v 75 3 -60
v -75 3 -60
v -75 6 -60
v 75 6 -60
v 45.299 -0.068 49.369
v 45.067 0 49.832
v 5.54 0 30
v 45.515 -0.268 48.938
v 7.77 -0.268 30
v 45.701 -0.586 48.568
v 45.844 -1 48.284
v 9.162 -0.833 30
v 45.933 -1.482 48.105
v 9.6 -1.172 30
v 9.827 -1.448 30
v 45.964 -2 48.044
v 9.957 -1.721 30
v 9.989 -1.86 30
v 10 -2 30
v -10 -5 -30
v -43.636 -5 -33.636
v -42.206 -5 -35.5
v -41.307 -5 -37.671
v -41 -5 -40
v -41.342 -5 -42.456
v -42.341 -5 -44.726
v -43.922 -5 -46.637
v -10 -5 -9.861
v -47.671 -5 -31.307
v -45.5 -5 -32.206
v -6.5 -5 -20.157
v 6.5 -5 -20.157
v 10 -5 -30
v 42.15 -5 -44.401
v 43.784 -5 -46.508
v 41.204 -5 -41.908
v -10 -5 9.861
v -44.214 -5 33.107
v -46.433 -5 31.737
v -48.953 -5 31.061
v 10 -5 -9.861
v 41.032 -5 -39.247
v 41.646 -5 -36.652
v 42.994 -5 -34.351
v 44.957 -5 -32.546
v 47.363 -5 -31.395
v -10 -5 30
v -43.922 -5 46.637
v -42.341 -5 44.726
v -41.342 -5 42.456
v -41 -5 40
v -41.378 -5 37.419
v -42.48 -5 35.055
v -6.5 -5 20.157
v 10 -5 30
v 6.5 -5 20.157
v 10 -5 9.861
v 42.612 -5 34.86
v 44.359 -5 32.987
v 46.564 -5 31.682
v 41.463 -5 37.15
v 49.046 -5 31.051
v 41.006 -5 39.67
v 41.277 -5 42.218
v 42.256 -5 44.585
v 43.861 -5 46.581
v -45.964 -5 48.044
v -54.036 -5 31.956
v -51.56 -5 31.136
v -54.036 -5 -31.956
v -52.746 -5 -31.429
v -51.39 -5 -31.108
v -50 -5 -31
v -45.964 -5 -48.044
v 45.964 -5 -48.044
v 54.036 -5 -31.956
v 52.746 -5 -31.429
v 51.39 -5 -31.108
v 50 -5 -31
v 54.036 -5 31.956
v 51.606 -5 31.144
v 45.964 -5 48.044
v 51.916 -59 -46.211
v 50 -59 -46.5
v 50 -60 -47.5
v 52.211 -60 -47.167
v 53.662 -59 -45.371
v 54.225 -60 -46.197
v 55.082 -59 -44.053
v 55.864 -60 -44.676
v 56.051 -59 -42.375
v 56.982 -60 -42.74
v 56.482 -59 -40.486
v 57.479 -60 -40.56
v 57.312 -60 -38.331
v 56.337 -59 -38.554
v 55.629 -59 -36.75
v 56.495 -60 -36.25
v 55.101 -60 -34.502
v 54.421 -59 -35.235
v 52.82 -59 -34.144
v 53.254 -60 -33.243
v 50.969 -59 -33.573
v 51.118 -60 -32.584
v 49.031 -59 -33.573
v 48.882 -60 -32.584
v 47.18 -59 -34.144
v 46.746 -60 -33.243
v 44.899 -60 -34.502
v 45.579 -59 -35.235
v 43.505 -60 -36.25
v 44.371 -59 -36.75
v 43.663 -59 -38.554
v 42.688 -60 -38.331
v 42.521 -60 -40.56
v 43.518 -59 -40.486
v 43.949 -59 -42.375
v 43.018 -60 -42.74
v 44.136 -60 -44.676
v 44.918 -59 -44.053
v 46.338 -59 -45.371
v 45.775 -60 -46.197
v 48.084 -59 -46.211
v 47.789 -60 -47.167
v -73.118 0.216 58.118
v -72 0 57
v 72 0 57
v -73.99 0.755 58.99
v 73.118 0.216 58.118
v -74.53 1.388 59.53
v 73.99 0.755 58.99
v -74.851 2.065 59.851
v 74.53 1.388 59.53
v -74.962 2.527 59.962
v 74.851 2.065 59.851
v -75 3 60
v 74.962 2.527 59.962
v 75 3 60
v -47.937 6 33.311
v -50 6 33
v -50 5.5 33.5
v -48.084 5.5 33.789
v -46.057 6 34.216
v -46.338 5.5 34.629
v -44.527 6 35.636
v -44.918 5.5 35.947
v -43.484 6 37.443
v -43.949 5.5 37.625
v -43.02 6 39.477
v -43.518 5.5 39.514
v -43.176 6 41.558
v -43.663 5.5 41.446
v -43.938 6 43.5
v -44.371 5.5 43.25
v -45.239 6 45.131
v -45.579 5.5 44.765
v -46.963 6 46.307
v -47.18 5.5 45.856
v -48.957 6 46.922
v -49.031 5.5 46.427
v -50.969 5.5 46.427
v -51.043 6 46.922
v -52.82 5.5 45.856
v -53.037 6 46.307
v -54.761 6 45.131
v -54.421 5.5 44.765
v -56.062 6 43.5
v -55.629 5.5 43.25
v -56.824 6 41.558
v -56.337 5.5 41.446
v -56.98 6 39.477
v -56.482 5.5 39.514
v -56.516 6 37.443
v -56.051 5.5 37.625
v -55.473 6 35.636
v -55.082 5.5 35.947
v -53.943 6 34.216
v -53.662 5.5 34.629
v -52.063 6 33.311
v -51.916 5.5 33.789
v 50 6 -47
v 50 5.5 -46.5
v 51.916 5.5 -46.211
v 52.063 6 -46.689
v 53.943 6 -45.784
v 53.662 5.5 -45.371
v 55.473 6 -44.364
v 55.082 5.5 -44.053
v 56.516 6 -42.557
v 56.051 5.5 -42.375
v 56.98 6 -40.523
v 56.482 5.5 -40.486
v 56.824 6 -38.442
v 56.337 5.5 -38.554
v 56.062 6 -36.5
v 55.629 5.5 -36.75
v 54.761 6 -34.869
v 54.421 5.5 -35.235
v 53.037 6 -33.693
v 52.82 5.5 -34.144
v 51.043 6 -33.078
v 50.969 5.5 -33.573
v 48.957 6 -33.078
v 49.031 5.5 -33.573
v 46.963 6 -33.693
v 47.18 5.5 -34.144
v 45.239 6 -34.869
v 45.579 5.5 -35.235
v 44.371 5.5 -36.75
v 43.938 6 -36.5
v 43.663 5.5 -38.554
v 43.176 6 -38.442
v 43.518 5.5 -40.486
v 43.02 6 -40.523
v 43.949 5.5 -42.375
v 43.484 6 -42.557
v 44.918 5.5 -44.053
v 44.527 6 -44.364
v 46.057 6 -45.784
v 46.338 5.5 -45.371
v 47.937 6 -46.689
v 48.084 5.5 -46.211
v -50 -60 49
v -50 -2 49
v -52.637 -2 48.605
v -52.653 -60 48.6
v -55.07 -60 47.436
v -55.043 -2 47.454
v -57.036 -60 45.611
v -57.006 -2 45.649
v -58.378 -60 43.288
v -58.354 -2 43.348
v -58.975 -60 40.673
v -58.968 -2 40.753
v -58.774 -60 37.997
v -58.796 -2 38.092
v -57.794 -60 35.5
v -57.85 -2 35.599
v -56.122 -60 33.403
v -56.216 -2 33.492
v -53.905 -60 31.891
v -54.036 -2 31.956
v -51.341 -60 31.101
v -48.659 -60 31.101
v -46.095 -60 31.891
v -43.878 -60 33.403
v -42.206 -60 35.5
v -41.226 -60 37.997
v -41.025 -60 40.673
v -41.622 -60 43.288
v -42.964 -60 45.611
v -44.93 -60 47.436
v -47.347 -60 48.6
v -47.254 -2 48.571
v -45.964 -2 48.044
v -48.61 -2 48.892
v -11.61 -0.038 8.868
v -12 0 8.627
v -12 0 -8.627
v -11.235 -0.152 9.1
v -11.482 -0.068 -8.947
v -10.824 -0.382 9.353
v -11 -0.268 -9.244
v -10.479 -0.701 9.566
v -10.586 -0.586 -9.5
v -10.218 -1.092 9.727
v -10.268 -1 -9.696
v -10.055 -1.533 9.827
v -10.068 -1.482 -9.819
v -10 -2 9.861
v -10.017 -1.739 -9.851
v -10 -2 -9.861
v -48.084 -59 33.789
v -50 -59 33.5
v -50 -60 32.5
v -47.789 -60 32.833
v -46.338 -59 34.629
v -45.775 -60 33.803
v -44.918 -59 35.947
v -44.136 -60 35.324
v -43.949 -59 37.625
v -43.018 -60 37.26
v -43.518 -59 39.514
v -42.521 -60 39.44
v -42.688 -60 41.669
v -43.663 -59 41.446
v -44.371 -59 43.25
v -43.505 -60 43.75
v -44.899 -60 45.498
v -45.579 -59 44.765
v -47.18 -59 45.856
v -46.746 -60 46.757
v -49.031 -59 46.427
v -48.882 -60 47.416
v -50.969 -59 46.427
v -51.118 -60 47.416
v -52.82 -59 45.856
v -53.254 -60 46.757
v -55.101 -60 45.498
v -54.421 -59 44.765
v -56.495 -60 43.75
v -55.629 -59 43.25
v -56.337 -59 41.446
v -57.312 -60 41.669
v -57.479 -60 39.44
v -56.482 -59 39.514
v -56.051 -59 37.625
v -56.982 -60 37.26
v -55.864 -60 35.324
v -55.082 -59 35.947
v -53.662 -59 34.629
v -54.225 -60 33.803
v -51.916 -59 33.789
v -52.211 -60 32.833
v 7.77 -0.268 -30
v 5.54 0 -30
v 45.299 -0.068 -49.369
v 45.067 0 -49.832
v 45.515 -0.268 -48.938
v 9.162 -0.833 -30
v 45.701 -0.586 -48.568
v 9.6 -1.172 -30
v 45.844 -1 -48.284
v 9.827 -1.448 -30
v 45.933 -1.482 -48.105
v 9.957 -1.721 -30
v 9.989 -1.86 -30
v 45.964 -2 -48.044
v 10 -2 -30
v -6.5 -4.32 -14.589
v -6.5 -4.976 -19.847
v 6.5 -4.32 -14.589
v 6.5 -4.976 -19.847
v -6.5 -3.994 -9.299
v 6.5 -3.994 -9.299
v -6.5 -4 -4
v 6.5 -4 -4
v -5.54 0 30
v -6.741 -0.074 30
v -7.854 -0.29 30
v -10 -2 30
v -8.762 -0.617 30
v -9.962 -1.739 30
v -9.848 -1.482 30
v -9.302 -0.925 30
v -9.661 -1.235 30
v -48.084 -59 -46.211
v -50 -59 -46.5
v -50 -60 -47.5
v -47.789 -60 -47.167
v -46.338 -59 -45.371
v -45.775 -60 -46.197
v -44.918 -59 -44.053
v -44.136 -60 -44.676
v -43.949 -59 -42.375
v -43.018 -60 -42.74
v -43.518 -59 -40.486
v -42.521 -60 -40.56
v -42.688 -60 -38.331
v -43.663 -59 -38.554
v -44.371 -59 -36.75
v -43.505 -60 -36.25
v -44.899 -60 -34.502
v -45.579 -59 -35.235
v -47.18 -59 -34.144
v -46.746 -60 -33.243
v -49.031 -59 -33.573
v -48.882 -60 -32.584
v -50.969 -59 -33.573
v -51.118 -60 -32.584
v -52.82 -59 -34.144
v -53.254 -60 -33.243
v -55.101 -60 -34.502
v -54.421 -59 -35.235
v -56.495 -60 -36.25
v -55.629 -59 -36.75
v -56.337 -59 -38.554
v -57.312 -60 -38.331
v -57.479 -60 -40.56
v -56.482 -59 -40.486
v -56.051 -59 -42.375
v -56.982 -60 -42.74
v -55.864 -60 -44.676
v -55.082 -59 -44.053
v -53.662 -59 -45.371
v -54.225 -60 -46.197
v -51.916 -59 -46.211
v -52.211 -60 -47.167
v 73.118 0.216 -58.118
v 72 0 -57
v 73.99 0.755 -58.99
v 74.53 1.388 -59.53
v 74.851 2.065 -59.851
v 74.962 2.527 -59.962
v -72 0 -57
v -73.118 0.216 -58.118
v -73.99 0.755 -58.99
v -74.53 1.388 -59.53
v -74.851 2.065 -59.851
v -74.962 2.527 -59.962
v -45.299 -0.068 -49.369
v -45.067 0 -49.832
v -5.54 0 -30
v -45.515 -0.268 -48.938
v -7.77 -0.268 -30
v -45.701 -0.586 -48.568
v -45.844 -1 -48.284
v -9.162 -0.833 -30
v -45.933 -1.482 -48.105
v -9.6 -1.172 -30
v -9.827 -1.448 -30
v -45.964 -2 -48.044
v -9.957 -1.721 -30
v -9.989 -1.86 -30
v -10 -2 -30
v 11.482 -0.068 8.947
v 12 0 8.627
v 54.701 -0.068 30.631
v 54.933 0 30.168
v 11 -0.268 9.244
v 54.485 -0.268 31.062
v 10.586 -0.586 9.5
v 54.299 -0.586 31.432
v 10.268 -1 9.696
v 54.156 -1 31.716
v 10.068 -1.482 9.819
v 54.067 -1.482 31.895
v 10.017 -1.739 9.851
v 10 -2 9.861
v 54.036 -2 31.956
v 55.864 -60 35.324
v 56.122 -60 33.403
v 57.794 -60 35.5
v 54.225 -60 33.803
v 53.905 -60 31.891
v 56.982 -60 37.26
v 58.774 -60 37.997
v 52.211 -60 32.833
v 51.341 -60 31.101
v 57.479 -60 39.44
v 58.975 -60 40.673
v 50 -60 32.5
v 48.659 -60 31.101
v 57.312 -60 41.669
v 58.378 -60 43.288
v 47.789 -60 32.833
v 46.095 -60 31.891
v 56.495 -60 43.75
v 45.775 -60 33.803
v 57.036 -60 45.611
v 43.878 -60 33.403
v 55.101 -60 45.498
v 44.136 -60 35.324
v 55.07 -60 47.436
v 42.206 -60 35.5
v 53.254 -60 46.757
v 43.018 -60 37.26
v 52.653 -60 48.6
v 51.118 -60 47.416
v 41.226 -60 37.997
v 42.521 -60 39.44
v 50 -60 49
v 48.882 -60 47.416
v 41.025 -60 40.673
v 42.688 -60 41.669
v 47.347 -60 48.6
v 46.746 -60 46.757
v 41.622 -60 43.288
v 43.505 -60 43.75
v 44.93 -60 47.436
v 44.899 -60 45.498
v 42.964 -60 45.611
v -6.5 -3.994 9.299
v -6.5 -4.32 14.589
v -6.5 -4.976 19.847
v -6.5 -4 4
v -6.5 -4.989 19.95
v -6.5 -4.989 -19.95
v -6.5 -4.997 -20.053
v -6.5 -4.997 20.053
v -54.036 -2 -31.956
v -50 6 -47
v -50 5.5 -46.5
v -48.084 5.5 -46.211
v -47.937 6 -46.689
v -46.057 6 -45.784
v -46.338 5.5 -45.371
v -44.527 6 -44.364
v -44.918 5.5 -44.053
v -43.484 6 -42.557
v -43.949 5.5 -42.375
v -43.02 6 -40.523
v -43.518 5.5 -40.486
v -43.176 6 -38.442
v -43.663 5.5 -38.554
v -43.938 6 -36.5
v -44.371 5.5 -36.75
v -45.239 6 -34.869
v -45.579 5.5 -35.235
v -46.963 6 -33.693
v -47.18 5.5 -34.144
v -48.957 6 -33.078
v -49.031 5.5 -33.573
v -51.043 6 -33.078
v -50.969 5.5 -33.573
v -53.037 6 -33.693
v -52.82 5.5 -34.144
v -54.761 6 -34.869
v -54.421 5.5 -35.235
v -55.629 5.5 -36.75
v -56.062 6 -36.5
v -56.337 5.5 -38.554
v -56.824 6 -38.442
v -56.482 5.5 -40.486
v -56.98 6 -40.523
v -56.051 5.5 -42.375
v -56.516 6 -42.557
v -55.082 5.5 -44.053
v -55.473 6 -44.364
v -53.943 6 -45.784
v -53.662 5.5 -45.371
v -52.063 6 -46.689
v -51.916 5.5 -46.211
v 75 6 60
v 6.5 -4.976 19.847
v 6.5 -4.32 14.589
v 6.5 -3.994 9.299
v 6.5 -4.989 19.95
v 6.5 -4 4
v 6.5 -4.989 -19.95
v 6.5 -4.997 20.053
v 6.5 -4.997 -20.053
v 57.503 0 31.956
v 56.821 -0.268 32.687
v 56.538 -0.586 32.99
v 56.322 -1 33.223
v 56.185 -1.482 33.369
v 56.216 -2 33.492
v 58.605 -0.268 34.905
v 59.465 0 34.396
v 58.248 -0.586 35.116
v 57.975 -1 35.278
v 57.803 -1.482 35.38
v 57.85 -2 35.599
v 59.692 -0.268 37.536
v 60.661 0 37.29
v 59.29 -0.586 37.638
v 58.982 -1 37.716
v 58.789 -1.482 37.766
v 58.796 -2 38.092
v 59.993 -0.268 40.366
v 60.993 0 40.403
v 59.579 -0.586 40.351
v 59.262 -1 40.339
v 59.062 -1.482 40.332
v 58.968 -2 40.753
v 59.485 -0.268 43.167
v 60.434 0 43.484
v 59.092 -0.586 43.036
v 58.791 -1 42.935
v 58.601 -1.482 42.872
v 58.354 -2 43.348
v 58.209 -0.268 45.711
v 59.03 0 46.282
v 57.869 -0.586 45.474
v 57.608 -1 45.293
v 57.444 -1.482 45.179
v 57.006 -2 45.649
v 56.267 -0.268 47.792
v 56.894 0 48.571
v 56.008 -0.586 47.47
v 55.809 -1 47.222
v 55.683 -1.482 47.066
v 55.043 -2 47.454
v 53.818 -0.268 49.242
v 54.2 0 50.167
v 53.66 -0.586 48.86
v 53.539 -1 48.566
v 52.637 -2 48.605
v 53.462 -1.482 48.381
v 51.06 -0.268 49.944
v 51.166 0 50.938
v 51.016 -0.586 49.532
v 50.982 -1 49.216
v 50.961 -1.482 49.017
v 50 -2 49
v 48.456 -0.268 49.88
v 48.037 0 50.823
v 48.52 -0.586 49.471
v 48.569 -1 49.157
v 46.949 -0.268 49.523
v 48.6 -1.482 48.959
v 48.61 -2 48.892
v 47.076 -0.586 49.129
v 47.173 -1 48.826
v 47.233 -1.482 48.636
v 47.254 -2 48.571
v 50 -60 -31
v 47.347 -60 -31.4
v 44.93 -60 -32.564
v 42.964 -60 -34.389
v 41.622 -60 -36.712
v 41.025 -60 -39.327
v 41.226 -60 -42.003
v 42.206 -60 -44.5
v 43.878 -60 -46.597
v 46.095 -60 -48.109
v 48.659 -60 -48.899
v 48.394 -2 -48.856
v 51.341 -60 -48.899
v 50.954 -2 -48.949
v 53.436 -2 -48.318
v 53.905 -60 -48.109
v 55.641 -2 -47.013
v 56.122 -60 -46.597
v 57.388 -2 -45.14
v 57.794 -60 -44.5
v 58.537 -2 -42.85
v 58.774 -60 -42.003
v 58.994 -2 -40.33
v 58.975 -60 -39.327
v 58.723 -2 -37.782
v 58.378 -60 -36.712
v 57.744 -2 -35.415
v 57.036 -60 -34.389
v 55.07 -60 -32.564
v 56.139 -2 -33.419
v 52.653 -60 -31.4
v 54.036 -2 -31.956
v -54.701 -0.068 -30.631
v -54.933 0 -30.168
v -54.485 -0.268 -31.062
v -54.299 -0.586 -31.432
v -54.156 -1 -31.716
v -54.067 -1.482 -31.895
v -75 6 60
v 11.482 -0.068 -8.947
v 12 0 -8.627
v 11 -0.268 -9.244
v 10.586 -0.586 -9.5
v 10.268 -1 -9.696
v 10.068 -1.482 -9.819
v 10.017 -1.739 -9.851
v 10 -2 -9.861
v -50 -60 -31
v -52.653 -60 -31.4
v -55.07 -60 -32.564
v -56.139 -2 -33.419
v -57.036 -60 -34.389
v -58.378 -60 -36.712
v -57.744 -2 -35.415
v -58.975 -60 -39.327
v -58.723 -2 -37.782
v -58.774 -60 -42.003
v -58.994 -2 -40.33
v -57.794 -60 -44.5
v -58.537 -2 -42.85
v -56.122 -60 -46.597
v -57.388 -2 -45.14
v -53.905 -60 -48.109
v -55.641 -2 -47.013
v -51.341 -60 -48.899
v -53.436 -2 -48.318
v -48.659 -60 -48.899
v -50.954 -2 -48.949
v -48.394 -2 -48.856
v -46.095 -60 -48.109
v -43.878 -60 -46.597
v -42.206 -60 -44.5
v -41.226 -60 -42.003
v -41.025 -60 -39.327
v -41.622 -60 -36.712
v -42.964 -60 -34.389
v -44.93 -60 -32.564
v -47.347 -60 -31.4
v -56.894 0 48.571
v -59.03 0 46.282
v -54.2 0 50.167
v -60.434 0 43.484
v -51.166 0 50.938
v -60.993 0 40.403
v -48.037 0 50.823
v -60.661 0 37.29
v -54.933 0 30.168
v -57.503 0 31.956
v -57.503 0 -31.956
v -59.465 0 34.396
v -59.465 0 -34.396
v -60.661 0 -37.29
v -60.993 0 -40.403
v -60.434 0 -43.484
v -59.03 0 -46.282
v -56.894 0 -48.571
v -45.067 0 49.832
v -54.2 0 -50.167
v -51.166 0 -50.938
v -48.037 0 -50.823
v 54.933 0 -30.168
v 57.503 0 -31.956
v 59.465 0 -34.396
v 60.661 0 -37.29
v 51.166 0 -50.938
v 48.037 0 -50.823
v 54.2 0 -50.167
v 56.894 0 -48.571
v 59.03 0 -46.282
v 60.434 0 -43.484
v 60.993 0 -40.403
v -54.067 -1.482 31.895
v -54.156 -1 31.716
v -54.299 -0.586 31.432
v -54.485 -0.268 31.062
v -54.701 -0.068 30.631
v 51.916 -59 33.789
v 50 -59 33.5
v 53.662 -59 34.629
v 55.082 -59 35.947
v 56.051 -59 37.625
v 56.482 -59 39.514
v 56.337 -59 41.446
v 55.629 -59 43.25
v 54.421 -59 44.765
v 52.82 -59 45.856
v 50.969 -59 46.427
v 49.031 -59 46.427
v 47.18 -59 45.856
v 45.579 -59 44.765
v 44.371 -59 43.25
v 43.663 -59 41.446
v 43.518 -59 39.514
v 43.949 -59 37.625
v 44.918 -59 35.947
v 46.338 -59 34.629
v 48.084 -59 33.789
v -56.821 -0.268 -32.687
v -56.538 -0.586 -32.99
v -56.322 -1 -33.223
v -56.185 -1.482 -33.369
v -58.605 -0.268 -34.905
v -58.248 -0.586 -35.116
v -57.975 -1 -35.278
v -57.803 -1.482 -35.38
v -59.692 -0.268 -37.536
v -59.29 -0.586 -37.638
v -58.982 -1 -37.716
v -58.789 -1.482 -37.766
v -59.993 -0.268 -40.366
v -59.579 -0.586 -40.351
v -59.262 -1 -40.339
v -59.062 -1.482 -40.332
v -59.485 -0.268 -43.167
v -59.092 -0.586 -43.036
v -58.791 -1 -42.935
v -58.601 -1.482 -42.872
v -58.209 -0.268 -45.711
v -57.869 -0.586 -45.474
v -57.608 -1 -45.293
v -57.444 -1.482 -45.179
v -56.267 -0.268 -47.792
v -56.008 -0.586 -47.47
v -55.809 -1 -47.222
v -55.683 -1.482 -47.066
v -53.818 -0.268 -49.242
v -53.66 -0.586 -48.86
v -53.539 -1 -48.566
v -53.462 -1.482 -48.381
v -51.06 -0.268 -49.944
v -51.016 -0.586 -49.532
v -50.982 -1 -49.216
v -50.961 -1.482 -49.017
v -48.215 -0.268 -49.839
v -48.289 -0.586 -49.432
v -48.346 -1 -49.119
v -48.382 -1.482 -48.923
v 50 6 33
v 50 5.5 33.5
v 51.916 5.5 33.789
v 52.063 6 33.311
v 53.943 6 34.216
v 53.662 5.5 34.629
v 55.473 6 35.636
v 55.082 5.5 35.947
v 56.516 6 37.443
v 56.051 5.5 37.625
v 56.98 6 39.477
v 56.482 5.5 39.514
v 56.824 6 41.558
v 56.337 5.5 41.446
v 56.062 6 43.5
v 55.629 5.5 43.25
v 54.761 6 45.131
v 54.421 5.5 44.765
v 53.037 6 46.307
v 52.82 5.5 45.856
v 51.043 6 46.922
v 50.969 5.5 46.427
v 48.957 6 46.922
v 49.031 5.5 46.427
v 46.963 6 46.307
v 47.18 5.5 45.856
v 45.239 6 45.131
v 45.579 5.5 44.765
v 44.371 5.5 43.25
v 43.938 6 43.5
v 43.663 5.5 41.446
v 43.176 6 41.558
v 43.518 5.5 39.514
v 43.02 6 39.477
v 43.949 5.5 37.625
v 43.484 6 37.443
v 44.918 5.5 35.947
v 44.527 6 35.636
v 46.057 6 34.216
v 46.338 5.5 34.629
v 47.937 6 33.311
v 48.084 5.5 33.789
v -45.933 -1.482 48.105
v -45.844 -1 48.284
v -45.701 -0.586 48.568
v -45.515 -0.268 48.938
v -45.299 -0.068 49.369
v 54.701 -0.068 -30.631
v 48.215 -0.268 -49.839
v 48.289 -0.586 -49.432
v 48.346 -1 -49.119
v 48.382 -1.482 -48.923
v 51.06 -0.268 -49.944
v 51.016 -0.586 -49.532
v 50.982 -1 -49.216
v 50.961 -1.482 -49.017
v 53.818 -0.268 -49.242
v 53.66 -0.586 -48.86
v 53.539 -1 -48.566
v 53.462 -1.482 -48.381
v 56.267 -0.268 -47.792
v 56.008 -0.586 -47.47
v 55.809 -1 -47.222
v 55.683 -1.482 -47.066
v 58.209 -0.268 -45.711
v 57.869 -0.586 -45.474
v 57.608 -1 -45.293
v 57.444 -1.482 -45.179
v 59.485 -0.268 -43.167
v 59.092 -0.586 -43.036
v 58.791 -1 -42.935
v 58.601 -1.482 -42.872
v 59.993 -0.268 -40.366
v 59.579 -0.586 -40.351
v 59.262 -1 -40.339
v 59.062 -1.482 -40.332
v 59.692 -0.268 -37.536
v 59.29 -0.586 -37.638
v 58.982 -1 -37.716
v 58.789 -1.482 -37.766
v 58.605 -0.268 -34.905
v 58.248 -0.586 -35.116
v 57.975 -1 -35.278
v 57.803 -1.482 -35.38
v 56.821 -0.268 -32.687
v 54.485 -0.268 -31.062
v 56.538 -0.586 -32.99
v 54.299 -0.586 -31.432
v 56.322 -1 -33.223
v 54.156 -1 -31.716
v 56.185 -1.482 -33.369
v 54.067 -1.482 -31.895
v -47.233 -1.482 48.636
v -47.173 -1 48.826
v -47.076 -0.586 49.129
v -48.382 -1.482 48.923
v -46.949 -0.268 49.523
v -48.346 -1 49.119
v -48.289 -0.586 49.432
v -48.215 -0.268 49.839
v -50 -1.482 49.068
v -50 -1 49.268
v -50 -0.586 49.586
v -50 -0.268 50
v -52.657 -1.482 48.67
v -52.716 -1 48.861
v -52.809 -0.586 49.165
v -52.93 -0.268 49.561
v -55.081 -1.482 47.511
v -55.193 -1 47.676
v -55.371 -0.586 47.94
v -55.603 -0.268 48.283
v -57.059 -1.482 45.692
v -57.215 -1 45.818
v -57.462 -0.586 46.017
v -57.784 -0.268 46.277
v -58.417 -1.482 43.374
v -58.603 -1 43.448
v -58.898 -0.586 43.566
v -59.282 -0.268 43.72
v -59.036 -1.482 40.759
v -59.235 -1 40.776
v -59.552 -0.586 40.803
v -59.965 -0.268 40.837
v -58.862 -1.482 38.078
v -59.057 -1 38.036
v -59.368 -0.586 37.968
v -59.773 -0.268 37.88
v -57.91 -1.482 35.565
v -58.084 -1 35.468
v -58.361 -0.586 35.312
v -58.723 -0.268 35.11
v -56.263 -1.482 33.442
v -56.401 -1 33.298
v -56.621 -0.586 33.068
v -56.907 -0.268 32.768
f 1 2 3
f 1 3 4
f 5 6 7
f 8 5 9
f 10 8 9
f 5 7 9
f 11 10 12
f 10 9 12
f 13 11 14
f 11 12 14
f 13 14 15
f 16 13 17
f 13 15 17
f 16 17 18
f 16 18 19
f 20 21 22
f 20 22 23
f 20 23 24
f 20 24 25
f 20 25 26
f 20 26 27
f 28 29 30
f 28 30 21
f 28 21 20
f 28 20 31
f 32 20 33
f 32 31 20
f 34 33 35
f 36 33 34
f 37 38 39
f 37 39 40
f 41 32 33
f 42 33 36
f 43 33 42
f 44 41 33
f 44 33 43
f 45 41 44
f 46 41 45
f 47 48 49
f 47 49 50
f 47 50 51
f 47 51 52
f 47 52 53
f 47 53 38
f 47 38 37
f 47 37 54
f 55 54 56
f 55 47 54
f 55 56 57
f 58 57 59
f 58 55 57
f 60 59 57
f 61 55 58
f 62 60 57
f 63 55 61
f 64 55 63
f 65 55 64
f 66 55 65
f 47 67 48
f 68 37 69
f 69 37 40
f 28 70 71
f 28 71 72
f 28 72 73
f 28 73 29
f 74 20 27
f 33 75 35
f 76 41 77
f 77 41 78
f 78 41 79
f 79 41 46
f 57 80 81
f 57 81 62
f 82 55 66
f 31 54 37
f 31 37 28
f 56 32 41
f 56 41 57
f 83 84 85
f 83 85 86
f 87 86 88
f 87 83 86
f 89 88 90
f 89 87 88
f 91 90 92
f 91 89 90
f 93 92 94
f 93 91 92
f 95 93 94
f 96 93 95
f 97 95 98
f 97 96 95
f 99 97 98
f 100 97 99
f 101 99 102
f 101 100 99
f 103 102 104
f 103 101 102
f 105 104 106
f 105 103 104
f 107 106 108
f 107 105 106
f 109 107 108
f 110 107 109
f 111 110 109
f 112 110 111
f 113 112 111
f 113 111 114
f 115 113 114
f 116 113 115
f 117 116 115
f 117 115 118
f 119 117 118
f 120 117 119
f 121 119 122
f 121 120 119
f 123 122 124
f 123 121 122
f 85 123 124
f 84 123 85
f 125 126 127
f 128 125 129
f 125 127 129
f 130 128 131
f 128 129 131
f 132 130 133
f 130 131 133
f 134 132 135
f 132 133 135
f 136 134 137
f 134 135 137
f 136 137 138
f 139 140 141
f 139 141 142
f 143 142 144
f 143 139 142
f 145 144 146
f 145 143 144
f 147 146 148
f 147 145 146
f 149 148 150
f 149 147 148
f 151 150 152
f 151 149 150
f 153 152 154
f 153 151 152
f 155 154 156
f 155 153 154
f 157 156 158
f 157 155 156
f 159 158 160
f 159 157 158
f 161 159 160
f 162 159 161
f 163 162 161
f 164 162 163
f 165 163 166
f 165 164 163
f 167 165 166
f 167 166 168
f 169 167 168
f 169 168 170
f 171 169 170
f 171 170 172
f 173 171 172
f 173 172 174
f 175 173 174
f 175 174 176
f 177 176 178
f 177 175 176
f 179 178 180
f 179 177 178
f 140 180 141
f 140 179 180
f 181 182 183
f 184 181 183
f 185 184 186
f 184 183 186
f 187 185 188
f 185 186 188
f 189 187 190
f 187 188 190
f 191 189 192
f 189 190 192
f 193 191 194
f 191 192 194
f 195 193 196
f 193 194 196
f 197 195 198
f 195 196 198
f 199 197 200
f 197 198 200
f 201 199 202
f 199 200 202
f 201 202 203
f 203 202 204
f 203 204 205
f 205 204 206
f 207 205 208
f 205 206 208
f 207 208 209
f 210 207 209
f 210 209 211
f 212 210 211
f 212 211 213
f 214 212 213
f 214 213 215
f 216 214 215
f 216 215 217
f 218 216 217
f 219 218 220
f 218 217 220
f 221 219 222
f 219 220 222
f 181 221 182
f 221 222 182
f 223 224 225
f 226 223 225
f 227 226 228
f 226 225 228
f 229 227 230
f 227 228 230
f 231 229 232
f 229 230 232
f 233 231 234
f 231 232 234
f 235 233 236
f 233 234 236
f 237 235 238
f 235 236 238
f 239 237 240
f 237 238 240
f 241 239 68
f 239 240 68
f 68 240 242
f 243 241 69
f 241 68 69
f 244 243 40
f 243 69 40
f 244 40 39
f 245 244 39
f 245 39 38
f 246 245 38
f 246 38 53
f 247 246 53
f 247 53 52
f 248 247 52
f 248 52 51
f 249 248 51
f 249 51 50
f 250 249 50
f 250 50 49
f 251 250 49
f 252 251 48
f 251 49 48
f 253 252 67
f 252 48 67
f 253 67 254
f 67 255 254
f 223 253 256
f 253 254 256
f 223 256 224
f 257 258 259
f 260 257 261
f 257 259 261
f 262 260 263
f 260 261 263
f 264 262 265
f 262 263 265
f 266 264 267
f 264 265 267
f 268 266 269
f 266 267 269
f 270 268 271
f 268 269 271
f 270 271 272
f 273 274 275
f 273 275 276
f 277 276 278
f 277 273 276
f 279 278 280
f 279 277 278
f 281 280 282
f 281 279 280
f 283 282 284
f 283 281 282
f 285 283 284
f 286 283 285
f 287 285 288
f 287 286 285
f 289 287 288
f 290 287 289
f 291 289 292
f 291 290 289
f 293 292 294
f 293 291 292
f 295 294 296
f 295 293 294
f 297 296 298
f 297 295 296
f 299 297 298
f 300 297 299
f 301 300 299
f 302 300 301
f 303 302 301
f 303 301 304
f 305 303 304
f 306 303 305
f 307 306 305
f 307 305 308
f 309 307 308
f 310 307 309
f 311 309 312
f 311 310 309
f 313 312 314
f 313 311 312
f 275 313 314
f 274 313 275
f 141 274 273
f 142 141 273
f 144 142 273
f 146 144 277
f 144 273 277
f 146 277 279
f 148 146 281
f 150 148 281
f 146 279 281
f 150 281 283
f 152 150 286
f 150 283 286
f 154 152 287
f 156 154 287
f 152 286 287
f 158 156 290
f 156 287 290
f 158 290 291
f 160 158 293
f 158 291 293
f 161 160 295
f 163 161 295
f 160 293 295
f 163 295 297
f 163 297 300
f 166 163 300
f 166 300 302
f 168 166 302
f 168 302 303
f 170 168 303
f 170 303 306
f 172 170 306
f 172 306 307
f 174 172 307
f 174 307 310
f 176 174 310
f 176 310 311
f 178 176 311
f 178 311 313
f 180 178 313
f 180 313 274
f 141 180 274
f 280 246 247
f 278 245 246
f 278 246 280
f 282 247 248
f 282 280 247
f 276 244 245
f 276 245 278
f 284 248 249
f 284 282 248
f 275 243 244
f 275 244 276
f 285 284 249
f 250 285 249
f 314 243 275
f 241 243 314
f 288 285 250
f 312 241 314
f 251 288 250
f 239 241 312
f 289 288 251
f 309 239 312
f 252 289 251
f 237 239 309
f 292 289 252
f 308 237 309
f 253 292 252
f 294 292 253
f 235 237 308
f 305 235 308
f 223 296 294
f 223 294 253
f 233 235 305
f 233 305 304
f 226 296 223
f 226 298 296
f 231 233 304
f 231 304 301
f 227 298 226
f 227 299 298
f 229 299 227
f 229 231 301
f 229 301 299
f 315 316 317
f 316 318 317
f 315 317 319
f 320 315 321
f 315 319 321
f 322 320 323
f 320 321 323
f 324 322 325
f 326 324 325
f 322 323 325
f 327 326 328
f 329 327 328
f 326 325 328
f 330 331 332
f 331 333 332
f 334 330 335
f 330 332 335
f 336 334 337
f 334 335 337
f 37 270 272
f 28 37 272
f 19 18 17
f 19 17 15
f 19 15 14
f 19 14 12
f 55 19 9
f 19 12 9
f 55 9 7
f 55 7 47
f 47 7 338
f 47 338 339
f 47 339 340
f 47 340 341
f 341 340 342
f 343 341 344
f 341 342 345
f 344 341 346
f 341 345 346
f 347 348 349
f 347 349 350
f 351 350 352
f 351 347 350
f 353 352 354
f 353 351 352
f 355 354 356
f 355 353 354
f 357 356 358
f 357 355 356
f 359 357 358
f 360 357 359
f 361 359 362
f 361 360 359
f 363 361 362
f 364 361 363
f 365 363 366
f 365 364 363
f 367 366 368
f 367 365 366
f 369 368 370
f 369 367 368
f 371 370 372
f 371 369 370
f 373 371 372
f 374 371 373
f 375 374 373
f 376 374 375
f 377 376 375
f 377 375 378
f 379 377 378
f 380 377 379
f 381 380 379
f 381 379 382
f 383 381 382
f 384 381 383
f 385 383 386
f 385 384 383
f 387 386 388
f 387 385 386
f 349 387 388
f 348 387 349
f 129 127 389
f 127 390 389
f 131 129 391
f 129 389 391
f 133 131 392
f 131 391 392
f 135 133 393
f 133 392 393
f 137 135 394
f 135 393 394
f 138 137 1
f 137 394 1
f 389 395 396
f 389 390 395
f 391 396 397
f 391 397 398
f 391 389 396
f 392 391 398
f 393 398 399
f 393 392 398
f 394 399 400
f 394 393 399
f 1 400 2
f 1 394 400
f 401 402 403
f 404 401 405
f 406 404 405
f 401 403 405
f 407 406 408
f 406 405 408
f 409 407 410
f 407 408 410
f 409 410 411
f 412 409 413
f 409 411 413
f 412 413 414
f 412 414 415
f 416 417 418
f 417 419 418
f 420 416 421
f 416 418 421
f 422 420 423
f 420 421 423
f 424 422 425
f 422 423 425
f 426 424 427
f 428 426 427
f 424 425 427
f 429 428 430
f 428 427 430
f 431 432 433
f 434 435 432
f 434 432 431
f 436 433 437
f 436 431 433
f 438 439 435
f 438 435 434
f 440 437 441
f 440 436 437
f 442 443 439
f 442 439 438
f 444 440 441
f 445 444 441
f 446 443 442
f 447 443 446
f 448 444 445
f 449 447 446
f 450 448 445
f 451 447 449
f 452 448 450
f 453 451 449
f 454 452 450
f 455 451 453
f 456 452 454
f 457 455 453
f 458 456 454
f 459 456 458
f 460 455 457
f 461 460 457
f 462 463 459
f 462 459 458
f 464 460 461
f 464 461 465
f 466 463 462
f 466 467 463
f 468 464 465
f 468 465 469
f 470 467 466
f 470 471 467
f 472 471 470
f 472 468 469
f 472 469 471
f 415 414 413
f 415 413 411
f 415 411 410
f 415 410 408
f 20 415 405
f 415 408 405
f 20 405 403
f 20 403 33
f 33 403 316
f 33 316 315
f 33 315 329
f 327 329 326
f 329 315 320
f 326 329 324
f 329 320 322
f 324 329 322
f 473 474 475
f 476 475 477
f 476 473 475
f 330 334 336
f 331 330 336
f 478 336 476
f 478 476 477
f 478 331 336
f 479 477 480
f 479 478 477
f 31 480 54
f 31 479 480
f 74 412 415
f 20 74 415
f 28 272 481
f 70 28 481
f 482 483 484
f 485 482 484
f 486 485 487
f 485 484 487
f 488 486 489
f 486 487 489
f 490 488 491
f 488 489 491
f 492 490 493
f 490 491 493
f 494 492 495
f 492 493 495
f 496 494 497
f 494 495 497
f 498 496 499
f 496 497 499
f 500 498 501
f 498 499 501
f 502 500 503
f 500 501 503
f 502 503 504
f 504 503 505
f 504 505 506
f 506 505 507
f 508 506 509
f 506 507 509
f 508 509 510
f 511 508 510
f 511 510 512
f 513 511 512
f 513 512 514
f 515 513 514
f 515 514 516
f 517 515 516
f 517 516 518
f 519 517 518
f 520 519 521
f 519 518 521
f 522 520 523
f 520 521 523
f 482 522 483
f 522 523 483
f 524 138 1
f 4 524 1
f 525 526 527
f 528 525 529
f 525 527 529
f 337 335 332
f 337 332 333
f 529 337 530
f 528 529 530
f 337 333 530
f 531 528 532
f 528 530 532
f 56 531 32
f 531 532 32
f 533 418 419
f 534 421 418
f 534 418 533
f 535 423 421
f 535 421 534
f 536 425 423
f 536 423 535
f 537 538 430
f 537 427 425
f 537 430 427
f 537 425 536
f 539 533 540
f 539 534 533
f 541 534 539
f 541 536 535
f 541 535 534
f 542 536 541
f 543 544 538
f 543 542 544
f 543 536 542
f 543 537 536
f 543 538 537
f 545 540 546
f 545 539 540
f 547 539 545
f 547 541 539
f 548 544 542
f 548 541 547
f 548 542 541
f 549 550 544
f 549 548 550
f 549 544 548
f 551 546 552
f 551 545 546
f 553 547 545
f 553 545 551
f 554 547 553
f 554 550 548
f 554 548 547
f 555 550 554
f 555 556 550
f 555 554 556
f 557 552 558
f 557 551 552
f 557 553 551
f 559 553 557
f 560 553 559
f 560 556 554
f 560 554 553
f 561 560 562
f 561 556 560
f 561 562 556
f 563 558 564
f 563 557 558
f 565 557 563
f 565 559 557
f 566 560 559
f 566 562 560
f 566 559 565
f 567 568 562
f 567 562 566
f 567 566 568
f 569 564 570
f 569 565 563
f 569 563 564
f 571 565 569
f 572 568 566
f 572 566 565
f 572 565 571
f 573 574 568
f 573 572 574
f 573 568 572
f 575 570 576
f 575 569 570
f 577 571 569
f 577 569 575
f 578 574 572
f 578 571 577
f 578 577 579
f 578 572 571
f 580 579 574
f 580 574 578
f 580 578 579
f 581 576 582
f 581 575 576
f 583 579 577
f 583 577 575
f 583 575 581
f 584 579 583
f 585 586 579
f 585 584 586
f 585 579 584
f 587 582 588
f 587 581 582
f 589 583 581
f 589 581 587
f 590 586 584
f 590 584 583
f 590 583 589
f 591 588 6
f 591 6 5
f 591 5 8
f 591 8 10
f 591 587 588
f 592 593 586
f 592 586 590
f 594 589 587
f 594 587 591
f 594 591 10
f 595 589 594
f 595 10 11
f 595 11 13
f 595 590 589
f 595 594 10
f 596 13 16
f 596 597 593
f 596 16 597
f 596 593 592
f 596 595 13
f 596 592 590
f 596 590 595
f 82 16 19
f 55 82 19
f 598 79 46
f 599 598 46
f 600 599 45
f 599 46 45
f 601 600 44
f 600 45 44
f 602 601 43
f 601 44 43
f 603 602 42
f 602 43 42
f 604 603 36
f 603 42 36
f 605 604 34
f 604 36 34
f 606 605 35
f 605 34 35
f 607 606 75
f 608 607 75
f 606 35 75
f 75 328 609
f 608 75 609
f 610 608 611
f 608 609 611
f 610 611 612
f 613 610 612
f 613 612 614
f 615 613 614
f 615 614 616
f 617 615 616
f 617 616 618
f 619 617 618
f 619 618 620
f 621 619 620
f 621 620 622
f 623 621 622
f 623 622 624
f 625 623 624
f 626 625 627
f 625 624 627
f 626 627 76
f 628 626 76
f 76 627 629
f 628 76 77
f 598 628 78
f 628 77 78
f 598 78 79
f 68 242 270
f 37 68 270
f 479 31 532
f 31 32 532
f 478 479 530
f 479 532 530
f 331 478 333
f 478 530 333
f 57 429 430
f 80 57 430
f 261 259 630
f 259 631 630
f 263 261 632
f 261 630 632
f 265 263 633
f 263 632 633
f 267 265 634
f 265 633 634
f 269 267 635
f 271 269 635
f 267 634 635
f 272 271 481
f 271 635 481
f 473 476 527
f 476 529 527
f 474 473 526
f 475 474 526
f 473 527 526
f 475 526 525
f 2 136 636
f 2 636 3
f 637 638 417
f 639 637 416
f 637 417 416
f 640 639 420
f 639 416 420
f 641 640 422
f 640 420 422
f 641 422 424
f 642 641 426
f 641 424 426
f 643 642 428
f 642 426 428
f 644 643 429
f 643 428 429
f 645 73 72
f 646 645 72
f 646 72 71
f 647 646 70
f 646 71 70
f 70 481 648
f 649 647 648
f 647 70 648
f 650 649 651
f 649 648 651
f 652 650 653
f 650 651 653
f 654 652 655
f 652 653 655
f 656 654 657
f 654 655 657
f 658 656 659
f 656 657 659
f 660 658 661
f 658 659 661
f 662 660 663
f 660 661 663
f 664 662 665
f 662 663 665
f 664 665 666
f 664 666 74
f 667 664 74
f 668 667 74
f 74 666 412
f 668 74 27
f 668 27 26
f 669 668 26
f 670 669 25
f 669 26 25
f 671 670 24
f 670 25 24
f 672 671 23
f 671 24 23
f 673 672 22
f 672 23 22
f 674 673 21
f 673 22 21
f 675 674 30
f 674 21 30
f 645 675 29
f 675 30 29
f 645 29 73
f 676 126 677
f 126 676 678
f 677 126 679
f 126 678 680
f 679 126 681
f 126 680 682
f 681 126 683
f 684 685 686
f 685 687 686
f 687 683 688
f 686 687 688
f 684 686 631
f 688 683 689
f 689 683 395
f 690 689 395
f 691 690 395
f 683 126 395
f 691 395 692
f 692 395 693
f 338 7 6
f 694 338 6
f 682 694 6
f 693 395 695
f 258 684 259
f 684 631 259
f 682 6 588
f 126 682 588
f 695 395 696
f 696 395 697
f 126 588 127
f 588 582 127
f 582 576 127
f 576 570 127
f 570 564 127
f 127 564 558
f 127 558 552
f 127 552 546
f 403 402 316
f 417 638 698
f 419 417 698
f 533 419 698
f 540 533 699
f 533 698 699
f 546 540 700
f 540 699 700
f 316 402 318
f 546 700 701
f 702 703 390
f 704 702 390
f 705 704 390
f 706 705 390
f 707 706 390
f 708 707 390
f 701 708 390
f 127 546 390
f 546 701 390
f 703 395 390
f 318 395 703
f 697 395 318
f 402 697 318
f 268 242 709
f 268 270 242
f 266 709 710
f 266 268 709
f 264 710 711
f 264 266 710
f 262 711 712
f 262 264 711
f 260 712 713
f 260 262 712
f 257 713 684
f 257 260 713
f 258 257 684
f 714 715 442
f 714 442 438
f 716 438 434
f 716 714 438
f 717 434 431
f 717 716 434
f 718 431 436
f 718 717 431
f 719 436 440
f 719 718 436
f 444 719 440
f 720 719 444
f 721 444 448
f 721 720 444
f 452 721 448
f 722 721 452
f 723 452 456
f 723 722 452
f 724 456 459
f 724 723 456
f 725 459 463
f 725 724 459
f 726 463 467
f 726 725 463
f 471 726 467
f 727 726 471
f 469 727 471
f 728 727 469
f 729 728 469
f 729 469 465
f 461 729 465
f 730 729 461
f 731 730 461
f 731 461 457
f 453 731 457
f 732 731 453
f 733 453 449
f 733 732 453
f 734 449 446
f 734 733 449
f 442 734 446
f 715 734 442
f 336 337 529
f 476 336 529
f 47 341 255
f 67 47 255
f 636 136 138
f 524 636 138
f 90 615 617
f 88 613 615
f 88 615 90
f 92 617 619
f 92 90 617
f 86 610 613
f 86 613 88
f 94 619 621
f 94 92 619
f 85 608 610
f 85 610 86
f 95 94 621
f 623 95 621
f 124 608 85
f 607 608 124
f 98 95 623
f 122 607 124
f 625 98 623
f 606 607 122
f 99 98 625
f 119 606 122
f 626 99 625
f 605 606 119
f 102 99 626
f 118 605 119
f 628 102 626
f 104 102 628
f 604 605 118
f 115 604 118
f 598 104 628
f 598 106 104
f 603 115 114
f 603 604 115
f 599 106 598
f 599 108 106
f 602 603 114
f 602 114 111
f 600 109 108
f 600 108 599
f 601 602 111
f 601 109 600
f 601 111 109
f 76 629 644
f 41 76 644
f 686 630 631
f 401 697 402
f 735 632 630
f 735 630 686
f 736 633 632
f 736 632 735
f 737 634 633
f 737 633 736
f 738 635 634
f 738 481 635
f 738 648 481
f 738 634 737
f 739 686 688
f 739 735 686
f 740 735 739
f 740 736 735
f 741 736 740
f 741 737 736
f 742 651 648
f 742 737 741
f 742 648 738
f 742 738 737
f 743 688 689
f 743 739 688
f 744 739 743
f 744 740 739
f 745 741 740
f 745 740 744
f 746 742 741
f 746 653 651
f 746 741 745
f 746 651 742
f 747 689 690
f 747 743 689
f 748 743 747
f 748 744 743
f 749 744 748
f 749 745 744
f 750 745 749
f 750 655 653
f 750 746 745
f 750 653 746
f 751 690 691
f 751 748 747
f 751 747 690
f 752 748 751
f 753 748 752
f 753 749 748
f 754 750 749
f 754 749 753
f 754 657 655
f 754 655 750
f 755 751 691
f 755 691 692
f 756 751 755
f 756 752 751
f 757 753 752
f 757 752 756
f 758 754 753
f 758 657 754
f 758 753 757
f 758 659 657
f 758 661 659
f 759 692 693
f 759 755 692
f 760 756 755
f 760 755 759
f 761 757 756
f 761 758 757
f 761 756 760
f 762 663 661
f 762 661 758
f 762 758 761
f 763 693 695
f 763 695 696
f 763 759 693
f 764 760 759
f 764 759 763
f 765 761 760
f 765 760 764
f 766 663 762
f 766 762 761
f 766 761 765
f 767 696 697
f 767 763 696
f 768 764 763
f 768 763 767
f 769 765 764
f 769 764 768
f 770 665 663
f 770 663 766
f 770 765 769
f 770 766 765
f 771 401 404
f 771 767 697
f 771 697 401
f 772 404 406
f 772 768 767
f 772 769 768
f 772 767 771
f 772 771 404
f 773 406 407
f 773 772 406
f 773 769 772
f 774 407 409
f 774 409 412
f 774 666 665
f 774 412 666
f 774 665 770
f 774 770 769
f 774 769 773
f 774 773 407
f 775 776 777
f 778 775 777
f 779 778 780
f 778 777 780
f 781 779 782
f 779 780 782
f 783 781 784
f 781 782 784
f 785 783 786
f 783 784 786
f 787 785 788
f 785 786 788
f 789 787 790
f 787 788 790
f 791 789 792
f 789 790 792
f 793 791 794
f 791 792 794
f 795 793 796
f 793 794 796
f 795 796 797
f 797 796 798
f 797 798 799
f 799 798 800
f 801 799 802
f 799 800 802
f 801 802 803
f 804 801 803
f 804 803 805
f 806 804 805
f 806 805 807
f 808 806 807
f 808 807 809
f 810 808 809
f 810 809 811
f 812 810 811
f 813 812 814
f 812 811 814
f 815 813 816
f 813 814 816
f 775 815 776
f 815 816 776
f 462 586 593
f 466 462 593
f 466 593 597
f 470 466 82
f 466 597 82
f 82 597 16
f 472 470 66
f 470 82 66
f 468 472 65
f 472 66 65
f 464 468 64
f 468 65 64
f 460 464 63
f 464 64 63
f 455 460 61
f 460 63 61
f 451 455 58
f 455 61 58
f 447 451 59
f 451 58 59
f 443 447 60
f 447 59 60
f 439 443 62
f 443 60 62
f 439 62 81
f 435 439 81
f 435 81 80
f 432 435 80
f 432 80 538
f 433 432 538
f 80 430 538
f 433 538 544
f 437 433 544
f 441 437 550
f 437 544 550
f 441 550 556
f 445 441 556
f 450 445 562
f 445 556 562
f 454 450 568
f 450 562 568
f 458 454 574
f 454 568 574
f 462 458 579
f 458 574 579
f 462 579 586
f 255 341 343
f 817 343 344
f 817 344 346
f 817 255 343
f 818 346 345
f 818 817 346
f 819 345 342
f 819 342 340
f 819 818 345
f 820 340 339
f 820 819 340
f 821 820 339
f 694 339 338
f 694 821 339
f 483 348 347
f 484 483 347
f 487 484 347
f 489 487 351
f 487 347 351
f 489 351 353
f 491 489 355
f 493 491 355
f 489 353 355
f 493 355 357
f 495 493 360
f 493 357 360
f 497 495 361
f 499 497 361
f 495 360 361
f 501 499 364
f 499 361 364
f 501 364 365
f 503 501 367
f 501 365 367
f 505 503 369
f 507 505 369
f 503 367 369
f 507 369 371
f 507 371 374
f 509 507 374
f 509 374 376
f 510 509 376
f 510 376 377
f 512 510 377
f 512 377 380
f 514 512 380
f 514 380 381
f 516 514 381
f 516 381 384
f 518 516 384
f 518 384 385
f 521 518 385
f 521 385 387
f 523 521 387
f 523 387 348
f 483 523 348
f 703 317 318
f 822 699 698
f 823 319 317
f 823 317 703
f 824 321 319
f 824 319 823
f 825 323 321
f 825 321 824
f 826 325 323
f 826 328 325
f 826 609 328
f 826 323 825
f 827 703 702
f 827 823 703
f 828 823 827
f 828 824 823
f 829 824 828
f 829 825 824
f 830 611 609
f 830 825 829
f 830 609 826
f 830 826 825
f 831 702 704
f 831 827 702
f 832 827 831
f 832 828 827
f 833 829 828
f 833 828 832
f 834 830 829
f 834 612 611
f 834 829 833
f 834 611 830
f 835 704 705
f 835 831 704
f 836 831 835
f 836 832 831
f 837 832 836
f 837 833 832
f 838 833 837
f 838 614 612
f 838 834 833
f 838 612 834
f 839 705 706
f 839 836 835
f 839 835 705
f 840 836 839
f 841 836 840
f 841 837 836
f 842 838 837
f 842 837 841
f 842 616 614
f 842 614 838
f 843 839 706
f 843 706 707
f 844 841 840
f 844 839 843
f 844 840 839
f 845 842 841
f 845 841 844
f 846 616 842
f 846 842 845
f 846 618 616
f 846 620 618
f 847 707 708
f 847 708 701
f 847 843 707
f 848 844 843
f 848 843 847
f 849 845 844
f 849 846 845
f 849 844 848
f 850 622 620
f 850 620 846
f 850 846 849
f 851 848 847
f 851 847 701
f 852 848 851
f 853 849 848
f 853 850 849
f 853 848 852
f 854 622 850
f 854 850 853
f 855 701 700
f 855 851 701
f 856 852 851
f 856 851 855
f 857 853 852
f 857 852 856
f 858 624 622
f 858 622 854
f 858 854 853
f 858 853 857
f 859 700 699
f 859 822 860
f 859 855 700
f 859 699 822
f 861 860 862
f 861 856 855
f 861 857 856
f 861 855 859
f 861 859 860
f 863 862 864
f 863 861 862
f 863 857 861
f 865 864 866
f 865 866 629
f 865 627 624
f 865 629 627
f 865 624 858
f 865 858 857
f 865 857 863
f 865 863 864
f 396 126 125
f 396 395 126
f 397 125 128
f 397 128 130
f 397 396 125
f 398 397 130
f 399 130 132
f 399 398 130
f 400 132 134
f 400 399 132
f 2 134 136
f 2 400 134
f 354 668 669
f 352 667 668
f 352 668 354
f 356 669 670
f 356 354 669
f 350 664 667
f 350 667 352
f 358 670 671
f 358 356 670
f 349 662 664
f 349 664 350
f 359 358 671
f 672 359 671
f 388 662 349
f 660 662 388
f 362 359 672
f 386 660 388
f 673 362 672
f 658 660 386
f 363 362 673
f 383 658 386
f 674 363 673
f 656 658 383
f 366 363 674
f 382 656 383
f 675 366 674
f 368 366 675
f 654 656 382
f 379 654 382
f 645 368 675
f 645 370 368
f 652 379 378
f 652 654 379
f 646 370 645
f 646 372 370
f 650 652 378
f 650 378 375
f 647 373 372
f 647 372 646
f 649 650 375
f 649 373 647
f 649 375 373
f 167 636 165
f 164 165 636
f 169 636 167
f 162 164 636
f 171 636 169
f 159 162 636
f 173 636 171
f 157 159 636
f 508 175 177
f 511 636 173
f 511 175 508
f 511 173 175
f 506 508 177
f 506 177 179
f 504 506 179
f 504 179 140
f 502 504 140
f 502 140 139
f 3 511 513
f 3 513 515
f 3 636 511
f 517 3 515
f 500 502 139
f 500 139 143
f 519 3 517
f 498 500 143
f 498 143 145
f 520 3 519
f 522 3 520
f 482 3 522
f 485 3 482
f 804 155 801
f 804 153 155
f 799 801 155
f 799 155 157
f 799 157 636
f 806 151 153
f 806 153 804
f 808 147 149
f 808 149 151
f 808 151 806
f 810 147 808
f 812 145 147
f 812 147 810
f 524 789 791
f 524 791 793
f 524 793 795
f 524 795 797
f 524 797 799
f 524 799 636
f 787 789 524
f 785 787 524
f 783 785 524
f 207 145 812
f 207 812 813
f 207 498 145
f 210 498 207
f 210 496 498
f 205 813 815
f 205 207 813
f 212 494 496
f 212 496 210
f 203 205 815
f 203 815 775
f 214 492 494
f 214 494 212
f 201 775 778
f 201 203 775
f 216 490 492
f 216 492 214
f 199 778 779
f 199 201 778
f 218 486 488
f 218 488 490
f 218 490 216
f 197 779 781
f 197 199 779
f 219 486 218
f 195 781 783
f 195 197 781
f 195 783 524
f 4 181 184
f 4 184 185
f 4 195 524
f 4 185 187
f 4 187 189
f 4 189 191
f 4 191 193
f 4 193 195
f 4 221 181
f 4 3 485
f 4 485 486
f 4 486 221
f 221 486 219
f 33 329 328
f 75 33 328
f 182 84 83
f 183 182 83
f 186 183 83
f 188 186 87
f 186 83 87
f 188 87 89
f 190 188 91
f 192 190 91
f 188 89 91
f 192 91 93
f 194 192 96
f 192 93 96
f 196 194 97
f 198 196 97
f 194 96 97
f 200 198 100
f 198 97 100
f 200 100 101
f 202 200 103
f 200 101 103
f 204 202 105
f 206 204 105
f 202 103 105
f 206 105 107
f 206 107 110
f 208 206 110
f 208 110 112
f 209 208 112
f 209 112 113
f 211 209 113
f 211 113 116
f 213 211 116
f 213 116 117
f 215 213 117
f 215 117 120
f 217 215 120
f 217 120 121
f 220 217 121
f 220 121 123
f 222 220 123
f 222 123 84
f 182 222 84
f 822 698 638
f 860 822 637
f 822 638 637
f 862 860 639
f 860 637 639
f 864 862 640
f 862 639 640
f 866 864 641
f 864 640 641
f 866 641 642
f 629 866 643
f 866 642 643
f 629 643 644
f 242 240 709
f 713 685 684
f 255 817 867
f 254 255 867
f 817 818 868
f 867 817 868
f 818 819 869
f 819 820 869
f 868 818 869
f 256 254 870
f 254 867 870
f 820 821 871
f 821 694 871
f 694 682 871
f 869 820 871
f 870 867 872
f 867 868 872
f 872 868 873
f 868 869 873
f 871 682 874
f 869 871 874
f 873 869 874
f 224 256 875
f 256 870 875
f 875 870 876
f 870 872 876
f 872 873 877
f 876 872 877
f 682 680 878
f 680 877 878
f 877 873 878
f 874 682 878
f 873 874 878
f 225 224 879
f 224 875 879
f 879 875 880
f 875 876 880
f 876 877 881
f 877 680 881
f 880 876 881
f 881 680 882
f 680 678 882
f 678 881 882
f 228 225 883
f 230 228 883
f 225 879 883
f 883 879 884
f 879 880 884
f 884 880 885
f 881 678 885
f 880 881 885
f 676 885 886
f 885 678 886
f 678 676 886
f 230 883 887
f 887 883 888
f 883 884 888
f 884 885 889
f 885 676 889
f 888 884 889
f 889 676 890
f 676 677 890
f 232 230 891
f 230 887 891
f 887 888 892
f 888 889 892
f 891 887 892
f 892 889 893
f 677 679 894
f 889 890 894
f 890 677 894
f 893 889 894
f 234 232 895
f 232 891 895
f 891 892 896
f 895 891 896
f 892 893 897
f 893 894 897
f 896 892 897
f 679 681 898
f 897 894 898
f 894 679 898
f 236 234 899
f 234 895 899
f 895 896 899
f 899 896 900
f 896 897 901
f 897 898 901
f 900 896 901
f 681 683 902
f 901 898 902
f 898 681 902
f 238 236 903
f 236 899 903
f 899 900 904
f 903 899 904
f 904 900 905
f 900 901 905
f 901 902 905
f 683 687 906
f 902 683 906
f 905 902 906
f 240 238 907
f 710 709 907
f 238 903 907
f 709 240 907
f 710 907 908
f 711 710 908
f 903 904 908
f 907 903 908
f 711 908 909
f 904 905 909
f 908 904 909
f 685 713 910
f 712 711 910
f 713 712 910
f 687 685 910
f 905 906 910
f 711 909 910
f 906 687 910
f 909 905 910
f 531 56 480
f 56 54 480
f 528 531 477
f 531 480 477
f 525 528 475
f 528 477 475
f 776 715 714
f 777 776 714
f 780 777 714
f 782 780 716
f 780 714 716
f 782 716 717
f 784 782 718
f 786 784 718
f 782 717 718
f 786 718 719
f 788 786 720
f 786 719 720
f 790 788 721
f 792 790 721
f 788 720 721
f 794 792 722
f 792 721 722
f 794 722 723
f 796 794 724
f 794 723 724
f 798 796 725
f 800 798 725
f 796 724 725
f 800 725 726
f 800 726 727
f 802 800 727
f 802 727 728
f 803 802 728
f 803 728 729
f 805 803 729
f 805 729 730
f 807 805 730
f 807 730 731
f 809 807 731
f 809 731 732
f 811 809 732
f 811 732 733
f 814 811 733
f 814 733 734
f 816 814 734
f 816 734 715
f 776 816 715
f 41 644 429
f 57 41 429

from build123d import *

# Parameters (mm, degrees)
SKETCH_1_W          = 150
SKETCH_1_H          = 120
EXTRUDE_1_DEPTH     = 6
SKETCH_2_R          = 9
EXTRUDE_2_DEPTH     = 60
EXTRUDE_3_DEPTH     = 5
SKETCH_4_R          = 6.5
CUT_EXTRUDE_1_DEPTH = 117.537547597
CUT_EXTRUDE_2_DEPTH = 6.5
FILLET_1_R          = 2
FILLET_3_R          = 3
CHAMFER_1_SIZE      = 1
CHAMFER_2_SIZE      = 0.5


with BuildPart() as part:
    # 草图1 → 凸台-拉伸1 (new body)
    with BuildSketch(Plane(origin=(0, 0, 0), x_dir=(1, 0, 0), z_dir=(0, 1, 0))):
        Rectangle(SKETCH_1_W, SKETCH_1_H)
    extrude(amount=EXTRUDE_1_DEPTH)

    # 草图2 → 凸台-拉伸2 (add)
    with BuildSketch(Plane.XZ):
        with Locations(Location((-50, 40, 0), (0, 0, 90))):
            Circle(SKETCH_2_R)
        with Locations(Location((50, 40, 0), (0, 0, 90))):
            Circle(SKETCH_2_R)
        with Locations(Location((50, -40, 0), (0, 0, 90))):
            Circle(SKETCH_2_R)
        with Locations(Location((-50, -40, 0), (0, 0, 90))):
            Circle(SKETCH_2_R)
    extrude(amount=EXTRUDE_2_DEPTH)

    # 草图3 → 凸台-拉伸3 (add)
    with BuildSketch(Plane.XZ):
        with BuildLine():
            Line((-10, 30), (-45.963934166, 48.044263334))
            ThreePointArc((-45.963934166, 48.044263334), (-42.34086844, 44.726278002), (-41, 40))
            ThreePointArc((-41, 40), (-45.273721998, 32.34086844), (-54.036065834, 31.955736666))
            Line((-54.036065834, 31.955736666), (-10, 9.861425059))
            Line((-10, 9.861425059), (-10, -9.861425059))
            Line((-10, -9.861425059), (-54.036065834, -31.955736666))
            ThreePointArc((-54.036065834, -31.955736666), (-45.273721998, -32.34086844), (-41, -40))
            ThreePointArc((-41, -40), (-42.34086844, -44.726278002), (-45.963934166, -48.044263334))
            Line((-45.963934166, -48.044263334), (-10, -30))
            Line((-10, -30), (10, -30))
            Line((10, -30), (45.963934166, -48.044263334))
            ThreePointArc((45.963934166, -48.044263334), (41.955736666, -35.963934166), (54.036065834, -31.955736666))
            Line((54.036065834, -31.955736666), (10, -9.861425059))
            Line((10, -9.861425059), (10, 9.861425059))
            Line((10, 9.861425059), (54.036065834, 31.955736666))
            ThreePointArc((54.036065834, 31.955736666), (41.955736666, 35.963934166), (45.963934166, 48.044263334))
            Line((45.963934166, 48.044263334), (10, 30))
            Line((10, 30), (-10, 30))
        make_face()
    extrude(amount=EXTRUDE_3_DEPTH)

    # 草图4 → 切除-拉伸1 (cut, through all)
    with BuildSketch(Plane.XZ.offset(60)):
        with Locations(Location((-50, 40, 0), (0, 0, 270))):
            Circle(SKETCH_4_R)
        with Locations(Location((50, -40, 0), (0, 0, 270))):
            Circle(SKETCH_4_R)
        with Locations(Location((50, 40, 0), (0, 0, 270))):
            Circle(SKETCH_4_R)
        with Locations(Location((-50, -40, 0), (0, 0, 270))):
            Circle(SKETCH_4_R)
    extrude(amount=-CUT_EXTRUDE_1_DEPTH, mode=Mode.SUBTRACT)

    # 草图5 → 切除-拉伸2 (cut, symmetric)
    with BuildSketch(Plane(origin=(0, 0, 0), x_dir=(0, 0, -1), z_dir=(1, 0, 0))):
        with BuildLine():
            Line((-20, -5), (20, -5))
            ThreePointArc((20, -5), (12.023735411, -4.120233419), (4, -4))
            Line((4, -4), (-4, -4))
            ThreePointArc((-4, -4), (-12.023735411, -4.120233419), (-20, -5))
        make_face()
    extrude(amount=CUT_EXTRUDE_2_DEPTH, both=True, mode=Mode.SUBTRACT)

    # 圆角1
    fillet_1_edges = [part.edges().sort_by_distance(p)[0] for p in [
        (0, -5, -20),
        (0, -5, 20),
        (-58.044263334, 0, -44.036065834),
        (58.044263334, 0, -44.036065834),
        (-58.757807089, 0, 42.073840639),
        (58.757807089, 0, 42.073840639),
        (-27.981967083, 0, -39.022131667),
        (32.018032917, 0, -20.908580862),
        (27.981967083, 0, 39.022131667),
        (-32.018032917, 0, 20.908580862),
        (-10, 0, 0),
        (-32.018032917, 0, -20.908580862),
        (-27.981967083, 0, 39.022131667),
        (32.018032917, 0, 20.908580862),
        (10, 0, 0),
        (27.981967083, 0, -39.022131667),
    ]]
    fillet(fillet_1_edges, radius=FILLET_1_R)

    # 圆角3
    fillet_3_edges = [part.edges().sort_by_distance(p)[0] for p in [
        (0, 0, 60),
        (-75, 0, 0),
        (0, 0, -60),
        (75, 0, 0),
    ]]
    fillet(fillet_3_edges, radius=FILLET_3_R)

    # 倒角1
    chamfer_1_edges = [part.edges().sort_by_distance(p)[0] for p in [
        (-50, -60, -33.5),
        (50, -60, 46.5),
        (50, -60, -33.5),
        (-50, -60, 46.5),
    ]]
    chamfer(chamfer_1_edges, length=CHAMFER_1_SIZE)

    # 倒角2
    chamfer_2_edges = [part.edges().sort_by_distance(p)[0] for p in [
        (-50, 6, -33.5),
        (50, 6, 46.5),
        (50, 6, -33.5),
        (-50, 6, 46.5),
    ]]
    chamfer(chamfer_2_edges, length=CHAMFER_2_SIZE)


solid = part.part
